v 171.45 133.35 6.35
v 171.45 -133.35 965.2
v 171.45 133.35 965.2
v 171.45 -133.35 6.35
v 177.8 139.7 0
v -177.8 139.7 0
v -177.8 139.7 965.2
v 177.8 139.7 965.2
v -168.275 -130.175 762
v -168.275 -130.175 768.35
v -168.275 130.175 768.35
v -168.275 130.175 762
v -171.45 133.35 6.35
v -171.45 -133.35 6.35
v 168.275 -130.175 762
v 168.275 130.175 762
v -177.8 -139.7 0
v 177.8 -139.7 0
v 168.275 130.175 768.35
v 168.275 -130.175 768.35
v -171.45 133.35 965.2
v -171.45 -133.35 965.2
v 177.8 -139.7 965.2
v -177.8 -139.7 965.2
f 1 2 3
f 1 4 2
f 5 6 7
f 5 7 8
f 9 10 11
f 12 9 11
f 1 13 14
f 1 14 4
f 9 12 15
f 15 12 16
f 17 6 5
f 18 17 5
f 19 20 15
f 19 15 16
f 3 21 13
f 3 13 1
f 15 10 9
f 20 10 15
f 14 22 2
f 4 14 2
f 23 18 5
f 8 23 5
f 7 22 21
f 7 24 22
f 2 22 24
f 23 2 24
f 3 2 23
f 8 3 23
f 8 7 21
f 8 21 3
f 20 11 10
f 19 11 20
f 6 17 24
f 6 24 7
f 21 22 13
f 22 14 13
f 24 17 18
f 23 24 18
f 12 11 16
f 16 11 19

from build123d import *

# Parameters (mm, degrees)
F0_W     = 355.6
F0_H     = 279.4
F1_DEPTH = 965.2
F2_T     = -6.35
F4_START = -196.85
F3_W     = 336.55
F3_H     = 260.35
F4_DEPTH = 6.35


with BuildPart() as f1:
    # F0 (on Top) → F1 (new body)
    with BuildSketch(Plane.XY):
        Rectangle(F0_W, F0_H)
    extrude(amount=F1_DEPTH)

    # F2
    f2_openings = [f1.faces().sort_by_distance(p)[0] for p in [
        (0, 0, 965.2),
    ]]
    offset(amount=F2_T, openings=f2_openings)


with BuildPart() as f4:
    # F3 (on face) → F4 (new body)
    with BuildSketch(Plane.XY.offset(965.2).offset(F4_START)):
        Rectangle(F3_W, F3_H)
    extrude(amount=-F4_DEPTH)


solid = Compound([f1.part, f4.part])
